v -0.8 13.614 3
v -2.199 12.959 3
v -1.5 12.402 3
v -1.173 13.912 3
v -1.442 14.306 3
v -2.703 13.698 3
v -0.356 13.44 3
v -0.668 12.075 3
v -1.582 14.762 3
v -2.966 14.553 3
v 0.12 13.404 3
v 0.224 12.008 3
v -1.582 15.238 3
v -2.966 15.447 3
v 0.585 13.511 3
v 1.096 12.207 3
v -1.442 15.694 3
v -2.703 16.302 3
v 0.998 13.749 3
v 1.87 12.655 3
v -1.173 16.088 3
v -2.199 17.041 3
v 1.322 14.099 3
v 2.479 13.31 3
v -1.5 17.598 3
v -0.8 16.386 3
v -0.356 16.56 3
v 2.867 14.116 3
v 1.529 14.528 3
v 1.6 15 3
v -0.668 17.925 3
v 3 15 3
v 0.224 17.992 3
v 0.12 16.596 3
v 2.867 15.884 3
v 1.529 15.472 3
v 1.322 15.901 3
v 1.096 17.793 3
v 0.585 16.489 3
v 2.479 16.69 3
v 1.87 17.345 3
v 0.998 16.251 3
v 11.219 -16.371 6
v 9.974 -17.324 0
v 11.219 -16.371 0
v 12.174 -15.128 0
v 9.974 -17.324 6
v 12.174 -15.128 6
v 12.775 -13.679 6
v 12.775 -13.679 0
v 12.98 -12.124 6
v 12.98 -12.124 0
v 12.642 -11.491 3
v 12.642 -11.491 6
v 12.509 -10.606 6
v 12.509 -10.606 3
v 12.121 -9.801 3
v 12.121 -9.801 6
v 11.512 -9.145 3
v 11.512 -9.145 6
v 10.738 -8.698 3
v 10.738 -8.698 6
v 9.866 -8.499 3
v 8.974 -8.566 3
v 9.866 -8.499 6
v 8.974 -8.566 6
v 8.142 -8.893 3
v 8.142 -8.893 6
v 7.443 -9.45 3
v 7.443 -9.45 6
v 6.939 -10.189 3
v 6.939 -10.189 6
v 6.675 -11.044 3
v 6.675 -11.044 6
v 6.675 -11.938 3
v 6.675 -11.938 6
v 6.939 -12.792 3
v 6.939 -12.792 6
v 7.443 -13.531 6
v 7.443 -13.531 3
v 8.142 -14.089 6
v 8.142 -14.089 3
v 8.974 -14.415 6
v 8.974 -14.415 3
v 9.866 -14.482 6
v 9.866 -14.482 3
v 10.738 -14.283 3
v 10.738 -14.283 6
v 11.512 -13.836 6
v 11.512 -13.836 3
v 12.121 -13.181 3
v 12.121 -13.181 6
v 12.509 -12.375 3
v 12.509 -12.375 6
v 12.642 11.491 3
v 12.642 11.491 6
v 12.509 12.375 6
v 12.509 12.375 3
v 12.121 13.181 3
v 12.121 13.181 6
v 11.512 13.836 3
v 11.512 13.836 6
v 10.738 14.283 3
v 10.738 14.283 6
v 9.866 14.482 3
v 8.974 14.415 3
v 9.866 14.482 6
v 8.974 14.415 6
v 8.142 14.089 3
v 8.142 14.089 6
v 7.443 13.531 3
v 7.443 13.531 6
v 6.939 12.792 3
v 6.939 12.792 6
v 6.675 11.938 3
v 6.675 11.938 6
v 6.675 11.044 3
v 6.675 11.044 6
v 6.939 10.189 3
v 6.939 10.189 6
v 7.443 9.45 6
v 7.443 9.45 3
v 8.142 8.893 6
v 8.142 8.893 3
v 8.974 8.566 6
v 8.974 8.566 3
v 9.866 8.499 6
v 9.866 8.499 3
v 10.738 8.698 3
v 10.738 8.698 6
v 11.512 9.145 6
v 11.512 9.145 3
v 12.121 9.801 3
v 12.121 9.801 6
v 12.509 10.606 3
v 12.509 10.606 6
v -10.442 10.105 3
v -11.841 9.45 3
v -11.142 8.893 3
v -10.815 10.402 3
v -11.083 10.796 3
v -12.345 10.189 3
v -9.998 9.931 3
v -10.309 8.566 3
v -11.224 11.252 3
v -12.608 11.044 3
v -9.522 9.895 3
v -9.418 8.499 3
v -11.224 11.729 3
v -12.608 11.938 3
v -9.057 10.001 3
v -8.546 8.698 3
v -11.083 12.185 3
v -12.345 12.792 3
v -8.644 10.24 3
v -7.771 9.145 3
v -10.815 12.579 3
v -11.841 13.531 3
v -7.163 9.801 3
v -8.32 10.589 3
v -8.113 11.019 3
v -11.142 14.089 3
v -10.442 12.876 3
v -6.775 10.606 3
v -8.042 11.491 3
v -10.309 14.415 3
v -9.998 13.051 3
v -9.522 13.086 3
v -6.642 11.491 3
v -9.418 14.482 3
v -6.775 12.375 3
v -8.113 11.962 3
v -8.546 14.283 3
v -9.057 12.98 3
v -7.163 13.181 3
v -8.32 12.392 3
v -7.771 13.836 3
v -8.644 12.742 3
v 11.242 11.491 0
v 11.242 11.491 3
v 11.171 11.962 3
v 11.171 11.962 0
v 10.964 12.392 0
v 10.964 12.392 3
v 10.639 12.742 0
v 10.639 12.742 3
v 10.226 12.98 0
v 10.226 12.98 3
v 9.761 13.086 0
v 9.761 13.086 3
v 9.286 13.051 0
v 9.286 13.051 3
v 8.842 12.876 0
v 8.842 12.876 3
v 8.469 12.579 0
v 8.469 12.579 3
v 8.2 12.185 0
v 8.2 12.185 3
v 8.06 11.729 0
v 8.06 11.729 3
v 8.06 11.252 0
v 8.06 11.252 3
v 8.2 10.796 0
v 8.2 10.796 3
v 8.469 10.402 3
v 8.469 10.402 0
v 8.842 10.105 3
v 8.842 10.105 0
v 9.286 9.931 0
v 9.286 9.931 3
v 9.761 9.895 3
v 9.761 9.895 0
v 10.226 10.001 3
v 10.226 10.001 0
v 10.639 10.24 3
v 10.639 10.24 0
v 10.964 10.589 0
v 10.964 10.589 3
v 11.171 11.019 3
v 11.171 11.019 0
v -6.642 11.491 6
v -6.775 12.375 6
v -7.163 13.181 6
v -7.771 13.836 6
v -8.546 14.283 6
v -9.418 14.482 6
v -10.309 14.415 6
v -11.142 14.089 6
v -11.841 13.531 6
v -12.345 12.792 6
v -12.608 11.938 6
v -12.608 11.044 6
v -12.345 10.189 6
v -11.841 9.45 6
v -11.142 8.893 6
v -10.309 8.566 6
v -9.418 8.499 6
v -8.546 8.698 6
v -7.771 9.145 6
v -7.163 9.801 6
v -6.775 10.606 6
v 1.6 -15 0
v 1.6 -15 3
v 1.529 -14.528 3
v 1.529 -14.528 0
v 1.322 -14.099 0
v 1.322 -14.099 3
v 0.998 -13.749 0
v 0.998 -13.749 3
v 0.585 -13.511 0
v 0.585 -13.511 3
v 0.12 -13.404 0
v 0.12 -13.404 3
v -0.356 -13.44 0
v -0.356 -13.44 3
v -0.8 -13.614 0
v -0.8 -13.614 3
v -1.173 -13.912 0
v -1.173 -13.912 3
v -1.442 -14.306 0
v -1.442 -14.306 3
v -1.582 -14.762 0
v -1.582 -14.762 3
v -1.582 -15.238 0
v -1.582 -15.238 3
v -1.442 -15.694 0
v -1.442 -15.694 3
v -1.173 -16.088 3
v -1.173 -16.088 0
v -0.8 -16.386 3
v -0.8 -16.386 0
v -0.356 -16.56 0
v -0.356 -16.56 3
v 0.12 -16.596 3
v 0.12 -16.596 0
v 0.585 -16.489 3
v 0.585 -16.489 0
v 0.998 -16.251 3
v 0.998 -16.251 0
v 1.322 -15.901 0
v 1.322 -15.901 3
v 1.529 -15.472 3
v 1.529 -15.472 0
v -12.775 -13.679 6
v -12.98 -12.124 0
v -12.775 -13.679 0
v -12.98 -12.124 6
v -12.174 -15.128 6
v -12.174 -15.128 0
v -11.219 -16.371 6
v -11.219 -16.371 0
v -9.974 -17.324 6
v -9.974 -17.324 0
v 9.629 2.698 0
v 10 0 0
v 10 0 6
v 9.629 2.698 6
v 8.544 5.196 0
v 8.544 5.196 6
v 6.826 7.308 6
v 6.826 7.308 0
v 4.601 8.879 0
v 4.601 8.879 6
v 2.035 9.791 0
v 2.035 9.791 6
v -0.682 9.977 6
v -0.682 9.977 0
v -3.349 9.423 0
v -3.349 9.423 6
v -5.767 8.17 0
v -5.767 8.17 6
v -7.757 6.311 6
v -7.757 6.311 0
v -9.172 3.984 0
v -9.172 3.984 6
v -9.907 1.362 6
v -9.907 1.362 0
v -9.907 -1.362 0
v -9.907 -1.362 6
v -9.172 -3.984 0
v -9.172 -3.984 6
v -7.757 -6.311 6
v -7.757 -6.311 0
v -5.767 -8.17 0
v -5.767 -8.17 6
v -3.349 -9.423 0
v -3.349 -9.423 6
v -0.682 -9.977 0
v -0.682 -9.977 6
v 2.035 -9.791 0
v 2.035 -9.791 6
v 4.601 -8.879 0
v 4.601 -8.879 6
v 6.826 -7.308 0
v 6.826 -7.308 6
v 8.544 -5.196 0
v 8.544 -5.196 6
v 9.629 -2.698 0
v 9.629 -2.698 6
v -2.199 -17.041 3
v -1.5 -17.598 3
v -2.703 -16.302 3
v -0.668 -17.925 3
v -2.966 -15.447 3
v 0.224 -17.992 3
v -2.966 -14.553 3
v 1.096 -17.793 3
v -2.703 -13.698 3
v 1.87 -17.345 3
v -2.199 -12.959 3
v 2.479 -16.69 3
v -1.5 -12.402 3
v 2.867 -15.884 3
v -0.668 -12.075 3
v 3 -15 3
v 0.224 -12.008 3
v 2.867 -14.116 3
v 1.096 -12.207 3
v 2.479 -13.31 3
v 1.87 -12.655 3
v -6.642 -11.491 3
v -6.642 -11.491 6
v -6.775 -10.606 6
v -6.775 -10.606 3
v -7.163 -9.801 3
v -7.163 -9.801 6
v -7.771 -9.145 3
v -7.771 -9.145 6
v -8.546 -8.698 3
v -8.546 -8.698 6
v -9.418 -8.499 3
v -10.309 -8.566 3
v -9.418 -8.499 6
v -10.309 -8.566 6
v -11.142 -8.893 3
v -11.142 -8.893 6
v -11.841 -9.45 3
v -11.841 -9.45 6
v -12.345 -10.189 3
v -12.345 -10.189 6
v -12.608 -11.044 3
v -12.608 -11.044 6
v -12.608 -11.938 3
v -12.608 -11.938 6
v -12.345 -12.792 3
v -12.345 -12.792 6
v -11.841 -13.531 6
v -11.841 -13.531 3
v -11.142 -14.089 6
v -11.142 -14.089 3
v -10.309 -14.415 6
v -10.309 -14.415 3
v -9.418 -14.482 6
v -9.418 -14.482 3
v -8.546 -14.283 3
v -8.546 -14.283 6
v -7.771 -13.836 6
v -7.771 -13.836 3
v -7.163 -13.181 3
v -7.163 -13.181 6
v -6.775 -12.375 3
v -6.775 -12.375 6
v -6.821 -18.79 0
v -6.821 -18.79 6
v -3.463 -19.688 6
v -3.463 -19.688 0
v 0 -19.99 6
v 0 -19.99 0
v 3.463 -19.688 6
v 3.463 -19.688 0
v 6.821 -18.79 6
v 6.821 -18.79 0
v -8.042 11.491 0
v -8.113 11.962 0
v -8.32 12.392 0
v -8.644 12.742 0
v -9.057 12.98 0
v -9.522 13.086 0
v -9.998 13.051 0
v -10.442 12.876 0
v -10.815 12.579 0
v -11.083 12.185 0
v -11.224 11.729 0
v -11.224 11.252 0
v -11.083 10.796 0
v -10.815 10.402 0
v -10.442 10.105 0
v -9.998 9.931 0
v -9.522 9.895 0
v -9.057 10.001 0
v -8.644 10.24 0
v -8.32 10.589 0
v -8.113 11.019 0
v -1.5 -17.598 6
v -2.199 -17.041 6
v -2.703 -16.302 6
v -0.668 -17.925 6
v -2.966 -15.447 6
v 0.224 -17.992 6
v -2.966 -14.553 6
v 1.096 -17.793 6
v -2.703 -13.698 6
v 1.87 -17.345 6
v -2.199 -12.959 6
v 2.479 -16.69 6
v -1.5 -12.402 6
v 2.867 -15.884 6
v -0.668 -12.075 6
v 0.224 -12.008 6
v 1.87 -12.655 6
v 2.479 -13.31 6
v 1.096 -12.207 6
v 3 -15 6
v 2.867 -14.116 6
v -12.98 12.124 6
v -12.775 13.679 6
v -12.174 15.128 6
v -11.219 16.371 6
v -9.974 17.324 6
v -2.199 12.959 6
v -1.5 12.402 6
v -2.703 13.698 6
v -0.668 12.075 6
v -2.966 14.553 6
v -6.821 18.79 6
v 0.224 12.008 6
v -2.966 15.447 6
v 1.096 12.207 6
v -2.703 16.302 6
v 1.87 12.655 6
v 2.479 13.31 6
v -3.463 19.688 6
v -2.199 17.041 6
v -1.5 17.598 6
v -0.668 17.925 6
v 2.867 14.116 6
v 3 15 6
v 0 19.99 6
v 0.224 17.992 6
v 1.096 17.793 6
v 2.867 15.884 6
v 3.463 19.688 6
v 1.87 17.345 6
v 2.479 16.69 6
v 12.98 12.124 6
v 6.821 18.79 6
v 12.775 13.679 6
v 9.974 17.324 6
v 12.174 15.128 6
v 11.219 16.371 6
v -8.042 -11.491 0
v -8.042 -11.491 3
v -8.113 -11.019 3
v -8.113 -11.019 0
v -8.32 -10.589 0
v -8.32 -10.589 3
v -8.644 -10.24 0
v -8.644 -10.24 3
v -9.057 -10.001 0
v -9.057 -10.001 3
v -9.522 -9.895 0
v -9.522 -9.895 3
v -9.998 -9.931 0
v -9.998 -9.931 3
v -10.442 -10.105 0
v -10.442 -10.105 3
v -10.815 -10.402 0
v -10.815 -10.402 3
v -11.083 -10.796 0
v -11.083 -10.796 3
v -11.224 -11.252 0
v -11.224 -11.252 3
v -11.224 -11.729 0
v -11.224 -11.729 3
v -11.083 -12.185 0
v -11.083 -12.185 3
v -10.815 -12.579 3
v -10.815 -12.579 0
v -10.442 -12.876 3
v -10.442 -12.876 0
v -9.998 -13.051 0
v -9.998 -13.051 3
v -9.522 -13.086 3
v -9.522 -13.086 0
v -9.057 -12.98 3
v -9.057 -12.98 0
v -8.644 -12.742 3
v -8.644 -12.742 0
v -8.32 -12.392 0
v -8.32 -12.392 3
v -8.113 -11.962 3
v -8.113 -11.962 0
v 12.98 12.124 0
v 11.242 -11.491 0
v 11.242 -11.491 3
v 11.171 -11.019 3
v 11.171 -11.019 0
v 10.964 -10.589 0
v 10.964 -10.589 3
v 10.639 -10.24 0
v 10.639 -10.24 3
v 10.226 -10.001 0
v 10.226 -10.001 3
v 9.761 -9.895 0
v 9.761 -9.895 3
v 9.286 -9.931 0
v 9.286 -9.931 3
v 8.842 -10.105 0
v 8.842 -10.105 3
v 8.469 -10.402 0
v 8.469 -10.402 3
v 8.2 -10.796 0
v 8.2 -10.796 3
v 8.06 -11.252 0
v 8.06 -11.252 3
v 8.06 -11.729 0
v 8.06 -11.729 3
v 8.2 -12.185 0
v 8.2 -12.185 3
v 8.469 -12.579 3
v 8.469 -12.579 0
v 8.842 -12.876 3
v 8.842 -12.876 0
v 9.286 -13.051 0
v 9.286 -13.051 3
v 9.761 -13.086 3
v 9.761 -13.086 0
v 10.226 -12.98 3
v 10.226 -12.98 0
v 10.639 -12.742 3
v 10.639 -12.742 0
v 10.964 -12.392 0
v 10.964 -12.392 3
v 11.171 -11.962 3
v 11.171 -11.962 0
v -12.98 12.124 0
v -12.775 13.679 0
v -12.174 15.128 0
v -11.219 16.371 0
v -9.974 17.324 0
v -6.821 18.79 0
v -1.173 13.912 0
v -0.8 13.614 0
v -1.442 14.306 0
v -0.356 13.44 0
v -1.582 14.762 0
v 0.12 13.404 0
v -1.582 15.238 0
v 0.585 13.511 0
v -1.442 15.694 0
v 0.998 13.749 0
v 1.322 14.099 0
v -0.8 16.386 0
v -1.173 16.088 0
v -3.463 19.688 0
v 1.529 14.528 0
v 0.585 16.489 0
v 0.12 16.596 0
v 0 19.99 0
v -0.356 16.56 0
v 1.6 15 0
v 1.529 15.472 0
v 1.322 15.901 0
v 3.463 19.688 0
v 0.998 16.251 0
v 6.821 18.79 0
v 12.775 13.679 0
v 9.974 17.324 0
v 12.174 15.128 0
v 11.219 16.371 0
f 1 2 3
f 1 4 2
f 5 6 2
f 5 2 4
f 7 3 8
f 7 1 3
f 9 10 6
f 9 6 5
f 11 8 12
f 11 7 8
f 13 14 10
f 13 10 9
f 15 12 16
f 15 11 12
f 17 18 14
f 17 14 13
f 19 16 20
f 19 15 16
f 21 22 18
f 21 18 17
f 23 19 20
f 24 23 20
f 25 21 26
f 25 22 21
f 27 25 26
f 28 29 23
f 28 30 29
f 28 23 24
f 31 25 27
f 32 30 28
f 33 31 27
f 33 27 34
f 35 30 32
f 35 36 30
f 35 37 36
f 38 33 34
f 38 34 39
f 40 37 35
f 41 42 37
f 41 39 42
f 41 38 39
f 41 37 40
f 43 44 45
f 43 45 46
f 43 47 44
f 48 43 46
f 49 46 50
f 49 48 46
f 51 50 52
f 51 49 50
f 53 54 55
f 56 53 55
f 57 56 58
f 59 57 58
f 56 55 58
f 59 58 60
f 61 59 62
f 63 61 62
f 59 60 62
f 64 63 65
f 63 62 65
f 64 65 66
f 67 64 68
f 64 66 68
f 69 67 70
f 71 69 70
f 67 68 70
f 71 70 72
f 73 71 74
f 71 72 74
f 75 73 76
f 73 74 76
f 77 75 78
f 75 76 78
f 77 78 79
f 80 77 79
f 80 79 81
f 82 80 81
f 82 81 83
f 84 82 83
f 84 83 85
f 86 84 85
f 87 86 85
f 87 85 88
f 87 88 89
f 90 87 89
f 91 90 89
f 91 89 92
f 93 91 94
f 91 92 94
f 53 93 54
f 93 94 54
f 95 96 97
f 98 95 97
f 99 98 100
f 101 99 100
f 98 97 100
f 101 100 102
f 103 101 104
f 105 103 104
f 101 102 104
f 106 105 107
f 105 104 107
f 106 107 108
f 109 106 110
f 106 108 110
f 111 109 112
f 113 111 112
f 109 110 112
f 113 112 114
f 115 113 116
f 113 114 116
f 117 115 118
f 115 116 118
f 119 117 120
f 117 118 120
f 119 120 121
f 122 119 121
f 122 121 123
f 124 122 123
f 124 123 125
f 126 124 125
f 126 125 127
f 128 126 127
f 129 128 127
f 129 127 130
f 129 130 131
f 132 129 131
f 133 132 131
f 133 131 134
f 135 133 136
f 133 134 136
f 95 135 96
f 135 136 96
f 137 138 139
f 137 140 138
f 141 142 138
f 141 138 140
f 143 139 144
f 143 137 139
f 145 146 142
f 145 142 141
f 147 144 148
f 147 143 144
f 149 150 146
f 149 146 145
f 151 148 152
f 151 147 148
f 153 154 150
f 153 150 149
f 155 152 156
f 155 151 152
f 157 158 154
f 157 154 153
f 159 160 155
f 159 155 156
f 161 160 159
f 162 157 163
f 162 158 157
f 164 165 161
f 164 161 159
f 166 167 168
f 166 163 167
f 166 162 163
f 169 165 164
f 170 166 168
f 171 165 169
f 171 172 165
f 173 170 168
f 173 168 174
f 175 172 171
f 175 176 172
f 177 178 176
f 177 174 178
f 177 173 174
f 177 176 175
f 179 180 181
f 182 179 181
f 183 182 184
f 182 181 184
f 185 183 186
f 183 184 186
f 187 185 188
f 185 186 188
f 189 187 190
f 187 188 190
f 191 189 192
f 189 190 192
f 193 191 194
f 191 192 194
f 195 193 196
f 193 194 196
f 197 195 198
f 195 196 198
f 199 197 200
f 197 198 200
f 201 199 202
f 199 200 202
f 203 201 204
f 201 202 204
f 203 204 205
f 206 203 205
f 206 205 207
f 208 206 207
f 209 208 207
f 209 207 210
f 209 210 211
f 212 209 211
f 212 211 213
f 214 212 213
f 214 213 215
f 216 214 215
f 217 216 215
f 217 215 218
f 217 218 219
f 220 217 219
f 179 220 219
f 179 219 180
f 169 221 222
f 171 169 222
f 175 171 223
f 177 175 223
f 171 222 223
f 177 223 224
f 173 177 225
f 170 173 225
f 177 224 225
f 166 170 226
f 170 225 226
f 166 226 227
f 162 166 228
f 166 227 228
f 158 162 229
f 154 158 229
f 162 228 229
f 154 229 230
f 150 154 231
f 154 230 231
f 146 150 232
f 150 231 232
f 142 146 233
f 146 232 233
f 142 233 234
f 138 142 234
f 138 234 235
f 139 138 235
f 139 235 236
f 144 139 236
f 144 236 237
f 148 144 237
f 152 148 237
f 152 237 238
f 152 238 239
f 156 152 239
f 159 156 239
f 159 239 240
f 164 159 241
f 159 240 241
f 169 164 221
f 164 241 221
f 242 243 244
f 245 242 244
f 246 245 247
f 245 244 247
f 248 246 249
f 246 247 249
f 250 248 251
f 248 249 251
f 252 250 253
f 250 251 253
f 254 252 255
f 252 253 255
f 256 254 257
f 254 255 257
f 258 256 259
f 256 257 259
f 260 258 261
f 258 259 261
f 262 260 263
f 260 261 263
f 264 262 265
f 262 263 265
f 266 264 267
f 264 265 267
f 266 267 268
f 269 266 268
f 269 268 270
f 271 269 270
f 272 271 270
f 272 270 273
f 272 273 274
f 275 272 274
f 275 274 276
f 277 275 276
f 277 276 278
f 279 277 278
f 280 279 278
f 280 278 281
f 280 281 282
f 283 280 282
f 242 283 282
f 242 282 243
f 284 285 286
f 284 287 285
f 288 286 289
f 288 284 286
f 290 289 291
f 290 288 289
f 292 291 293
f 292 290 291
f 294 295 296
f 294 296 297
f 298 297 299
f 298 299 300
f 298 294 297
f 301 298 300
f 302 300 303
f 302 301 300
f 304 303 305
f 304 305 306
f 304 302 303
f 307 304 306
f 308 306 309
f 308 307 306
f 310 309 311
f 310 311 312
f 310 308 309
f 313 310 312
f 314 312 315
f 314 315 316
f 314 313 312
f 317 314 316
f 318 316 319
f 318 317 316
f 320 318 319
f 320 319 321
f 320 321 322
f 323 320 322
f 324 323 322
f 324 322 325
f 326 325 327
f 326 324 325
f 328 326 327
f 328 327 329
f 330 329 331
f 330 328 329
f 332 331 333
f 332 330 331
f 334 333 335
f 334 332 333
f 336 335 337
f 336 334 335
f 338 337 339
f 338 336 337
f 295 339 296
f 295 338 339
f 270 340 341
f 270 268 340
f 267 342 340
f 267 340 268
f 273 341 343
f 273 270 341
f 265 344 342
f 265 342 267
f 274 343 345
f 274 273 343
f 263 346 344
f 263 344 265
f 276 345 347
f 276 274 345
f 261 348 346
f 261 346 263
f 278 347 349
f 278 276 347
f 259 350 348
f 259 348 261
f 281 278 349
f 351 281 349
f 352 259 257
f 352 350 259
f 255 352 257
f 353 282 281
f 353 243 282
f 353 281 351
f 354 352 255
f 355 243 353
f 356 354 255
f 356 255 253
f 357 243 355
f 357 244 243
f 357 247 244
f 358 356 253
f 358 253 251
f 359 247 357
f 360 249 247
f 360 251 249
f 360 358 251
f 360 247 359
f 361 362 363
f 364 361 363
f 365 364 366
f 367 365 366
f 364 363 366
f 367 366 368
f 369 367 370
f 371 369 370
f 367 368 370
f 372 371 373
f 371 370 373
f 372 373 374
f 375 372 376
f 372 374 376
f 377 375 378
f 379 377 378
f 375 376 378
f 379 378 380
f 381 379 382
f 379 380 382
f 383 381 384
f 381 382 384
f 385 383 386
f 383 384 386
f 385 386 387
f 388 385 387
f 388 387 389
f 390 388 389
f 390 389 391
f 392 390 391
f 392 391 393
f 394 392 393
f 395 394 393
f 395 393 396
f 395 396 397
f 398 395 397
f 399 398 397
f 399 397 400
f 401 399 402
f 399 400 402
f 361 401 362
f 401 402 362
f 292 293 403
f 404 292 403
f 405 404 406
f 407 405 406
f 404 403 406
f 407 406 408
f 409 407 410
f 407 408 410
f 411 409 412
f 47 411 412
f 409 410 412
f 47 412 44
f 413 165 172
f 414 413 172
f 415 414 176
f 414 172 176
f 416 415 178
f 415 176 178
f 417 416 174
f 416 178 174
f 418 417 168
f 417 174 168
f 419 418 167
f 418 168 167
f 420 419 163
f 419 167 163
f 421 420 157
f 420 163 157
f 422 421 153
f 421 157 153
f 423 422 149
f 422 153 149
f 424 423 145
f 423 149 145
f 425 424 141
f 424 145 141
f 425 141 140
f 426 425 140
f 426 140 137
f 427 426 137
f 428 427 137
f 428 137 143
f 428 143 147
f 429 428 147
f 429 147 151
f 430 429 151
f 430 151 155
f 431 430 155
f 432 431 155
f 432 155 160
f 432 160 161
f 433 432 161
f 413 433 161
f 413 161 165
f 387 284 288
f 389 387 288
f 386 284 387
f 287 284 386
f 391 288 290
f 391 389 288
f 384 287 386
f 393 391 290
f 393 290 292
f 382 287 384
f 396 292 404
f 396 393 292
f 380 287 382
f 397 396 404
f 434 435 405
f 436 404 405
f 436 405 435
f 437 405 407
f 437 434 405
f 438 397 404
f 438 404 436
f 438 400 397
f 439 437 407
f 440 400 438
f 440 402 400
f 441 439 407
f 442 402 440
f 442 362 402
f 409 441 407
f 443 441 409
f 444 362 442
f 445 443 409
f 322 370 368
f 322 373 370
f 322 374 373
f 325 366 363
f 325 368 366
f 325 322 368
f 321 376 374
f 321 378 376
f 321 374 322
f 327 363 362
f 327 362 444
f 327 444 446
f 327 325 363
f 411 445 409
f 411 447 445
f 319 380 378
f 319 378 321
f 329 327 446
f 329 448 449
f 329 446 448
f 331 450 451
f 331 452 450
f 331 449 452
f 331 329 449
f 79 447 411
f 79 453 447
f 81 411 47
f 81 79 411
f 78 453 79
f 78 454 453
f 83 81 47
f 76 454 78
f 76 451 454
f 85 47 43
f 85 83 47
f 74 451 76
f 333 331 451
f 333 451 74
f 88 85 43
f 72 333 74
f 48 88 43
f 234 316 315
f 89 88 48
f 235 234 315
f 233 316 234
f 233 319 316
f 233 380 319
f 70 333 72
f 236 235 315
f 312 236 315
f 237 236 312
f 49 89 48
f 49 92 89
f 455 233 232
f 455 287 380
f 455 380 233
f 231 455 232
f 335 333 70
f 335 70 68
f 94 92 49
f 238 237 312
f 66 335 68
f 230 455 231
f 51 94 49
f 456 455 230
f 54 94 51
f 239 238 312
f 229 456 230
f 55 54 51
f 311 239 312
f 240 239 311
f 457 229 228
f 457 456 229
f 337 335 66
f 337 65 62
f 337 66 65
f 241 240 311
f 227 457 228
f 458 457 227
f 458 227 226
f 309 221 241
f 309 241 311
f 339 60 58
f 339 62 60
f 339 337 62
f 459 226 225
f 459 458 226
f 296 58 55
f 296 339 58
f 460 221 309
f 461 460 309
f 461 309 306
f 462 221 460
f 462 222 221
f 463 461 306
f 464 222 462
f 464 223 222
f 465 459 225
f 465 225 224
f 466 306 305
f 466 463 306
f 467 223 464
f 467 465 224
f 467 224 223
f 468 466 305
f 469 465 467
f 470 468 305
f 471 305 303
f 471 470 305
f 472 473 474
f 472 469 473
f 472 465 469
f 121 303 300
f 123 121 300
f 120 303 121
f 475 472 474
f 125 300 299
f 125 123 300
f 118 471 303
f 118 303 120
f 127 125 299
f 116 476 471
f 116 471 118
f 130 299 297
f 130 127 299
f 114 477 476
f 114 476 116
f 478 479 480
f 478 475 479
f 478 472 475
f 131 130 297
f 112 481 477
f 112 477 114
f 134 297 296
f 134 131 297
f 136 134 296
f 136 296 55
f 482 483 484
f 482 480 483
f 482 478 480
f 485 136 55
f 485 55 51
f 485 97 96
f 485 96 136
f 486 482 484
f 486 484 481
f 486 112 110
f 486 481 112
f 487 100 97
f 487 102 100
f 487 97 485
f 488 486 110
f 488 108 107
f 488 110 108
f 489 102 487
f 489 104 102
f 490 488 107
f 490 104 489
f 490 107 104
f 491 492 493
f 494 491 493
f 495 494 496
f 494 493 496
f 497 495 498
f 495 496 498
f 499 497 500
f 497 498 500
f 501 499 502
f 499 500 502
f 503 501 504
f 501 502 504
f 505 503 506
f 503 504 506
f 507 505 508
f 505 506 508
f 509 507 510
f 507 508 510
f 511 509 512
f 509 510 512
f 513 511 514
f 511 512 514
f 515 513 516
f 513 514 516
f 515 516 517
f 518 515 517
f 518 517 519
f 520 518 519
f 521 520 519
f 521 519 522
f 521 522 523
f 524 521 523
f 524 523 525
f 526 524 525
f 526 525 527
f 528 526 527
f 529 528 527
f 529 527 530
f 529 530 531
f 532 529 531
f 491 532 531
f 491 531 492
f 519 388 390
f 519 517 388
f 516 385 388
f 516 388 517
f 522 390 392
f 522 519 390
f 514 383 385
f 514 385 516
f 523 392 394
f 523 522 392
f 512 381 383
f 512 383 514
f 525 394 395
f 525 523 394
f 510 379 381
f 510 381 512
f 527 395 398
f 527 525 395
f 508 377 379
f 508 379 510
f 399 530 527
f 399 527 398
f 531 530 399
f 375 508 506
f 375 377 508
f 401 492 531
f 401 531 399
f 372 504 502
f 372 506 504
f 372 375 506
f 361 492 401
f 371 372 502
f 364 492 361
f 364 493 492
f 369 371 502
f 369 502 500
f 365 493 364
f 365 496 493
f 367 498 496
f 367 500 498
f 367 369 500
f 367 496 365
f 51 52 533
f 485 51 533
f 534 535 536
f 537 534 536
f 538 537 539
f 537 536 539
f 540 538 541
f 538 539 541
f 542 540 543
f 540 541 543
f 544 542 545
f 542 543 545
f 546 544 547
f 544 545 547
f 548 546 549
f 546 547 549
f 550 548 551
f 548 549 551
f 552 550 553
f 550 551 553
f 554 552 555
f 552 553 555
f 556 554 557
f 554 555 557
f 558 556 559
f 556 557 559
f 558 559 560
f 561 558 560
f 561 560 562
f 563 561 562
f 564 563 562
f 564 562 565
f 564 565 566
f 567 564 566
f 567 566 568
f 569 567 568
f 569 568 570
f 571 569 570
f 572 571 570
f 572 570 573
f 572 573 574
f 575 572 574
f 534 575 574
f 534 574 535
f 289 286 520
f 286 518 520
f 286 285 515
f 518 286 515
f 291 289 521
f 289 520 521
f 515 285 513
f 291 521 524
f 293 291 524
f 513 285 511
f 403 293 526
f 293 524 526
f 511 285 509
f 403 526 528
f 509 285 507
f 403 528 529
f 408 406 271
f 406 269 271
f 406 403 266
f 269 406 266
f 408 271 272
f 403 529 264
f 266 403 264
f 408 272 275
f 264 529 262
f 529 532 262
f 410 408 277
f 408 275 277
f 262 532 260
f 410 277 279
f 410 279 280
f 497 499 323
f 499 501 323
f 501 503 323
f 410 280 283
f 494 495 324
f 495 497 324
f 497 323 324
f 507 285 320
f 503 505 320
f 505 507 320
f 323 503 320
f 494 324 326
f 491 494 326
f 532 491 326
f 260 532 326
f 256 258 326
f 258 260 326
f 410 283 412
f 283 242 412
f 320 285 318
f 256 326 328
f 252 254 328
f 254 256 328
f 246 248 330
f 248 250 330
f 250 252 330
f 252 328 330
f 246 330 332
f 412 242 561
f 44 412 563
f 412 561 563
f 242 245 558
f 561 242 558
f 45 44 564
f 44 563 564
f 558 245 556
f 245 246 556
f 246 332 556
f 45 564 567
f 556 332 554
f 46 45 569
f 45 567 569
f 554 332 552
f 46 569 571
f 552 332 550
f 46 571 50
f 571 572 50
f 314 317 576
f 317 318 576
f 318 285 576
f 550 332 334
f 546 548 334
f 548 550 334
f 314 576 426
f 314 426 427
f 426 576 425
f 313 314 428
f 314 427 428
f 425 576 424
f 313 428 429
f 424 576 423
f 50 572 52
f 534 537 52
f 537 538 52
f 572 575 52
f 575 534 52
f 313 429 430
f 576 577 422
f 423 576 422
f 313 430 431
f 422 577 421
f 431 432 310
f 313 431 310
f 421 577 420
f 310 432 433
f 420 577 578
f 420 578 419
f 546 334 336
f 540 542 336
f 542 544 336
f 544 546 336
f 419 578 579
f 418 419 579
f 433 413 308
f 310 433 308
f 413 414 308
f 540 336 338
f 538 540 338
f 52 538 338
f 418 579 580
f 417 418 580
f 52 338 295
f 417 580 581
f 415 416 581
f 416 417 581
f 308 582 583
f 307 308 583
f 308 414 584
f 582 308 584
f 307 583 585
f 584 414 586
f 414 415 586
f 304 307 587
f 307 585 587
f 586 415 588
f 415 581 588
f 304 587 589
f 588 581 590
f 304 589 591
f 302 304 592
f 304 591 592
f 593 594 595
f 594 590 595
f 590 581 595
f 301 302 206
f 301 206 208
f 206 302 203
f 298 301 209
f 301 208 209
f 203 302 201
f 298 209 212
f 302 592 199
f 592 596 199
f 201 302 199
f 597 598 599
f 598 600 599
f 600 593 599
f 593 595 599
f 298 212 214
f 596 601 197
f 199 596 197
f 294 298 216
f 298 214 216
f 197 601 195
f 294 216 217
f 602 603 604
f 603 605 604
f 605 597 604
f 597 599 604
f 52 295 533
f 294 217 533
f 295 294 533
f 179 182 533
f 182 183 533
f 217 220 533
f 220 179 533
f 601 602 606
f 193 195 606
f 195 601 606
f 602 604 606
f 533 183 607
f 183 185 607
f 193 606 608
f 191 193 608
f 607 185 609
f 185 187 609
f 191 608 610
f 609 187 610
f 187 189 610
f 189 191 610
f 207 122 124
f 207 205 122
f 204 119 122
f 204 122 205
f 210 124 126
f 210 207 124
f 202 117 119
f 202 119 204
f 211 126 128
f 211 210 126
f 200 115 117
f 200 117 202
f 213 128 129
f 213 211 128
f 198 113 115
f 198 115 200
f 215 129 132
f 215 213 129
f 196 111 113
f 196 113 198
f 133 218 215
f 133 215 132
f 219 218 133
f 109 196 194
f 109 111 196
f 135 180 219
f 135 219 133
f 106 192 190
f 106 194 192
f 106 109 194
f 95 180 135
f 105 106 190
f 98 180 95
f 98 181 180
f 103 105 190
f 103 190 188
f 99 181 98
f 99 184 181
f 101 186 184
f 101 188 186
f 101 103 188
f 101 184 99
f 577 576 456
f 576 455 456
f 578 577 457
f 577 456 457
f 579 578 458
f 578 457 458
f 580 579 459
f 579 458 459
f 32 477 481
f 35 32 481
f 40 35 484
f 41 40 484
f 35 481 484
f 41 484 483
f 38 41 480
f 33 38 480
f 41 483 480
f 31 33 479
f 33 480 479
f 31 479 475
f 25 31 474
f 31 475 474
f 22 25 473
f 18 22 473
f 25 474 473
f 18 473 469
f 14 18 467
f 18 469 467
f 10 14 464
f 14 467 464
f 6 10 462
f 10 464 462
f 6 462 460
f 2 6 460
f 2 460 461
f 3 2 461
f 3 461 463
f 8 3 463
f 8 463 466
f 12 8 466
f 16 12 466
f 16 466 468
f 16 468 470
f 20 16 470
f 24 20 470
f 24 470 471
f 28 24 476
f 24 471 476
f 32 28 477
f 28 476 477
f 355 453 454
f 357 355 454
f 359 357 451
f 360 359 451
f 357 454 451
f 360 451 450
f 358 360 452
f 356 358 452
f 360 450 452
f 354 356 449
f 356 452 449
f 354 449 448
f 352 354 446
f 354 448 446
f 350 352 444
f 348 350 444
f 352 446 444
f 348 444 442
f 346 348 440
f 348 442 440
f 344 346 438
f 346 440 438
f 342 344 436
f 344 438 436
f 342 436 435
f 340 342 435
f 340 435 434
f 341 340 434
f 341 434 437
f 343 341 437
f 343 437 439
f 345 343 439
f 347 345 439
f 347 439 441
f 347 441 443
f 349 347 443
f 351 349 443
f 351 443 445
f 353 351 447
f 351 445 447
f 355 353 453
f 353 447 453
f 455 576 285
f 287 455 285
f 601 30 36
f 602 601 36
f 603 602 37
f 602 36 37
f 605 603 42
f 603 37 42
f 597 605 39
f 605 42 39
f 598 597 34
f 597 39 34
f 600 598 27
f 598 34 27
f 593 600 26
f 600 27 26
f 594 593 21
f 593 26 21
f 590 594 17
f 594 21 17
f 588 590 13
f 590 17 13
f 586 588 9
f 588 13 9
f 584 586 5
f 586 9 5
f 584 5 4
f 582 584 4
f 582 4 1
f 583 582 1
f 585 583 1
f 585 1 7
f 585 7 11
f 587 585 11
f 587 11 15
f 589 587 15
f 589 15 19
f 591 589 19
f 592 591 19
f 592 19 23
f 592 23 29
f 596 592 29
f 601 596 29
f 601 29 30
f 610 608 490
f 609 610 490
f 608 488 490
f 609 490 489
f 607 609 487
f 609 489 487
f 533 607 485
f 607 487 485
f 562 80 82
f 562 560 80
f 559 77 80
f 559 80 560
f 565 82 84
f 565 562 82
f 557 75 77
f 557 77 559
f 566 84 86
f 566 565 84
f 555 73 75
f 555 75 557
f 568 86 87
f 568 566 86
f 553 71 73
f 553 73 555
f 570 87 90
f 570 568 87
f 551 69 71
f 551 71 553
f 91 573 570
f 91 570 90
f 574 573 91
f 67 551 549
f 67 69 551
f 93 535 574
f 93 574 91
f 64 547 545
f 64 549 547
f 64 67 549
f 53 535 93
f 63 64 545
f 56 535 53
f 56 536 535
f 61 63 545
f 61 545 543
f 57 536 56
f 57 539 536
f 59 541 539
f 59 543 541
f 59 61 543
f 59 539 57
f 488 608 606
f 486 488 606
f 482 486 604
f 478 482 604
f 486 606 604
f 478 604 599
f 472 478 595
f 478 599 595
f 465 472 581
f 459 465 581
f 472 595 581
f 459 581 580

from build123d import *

# Parameters (mm, degrees)
SKETCH_1_R          = 10
EXTRUDE_1_DEPTH     = 6
SKETCH_2_R          = 1.6
CUT_EXTRUDE_1_DEPTH = 7
FILLET_1_R          = 6
FILLET_2_R          = 6
FILLET_3_R          = 6
FILLET_4_R          = 6
SKETCH_3_R          = 3
CUT_EXTRUDE_2_DEPTH = 3


with BuildPart() as part:
    # 草图1 → 拉伸1 (new body)
    with BuildSketch(Plane.XY):
        with BuildLine():
            Line((-12.98, 15.202621484), (-12.98, -15.202621484))
            ThreePointArc((-12.98, -15.202621484), (0, -19.99), (12.98, -15.202621484))
            Line((12.98, -15.202621484), (12.98, 15.202621484))
            ThreePointArc((12.98, 15.202621484), (0, 19.99), (-12.98, 15.202621484))
        make_face()
        Circle(SKETCH_1_R, mode=Mode.SUBTRACT)
    extrude(amount=EXTRUDE_1_DEPTH)

    # 草图2 → 切除-拉伸1 (cut)
    with BuildSketch(Plane.XY.offset(6)):
        with Locations((-9.641814145, 11.490666647)):
            Circle(SKETCH_2_R)
        with Locations((0, 15)):
            Circle(SKETCH_2_R)
        with Locations((9.641814145, 11.490666647)):
            Circle(SKETCH_2_R)
        with Locations((-9.641814145, -11.490666647)):
            Circle(SKETCH_2_R)
        with Locations((0, -15)):
            Circle(SKETCH_2_R)
        with Locations((9.641814145, -11.490666647)):
            Circle(SKETCH_2_R)
    extrude(amount=-CUT_EXTRUDE_1_DEPTH, mode=Mode.SUBTRACT)

    # 圆角1
    fillet_1_edges = [part.edges().sort_by_distance(p)[0] for p in [
        (-12.98, 15.202621484, 3),
    ]]
    fillet(fillet_1_edges, radius=FILLET_1_R)

    # 圆角2
    fillet_2_edges = [part.edges().sort_by_distance(p)[0] for p in [
        (12.98, 15.202621484, 3),
    ]]
    fillet(fillet_2_edges, radius=FILLET_2_R)

    # 圆角3
    fillet_3_edges = [part.edges().sort_by_distance(p)[0] for p in [
        (-12.98, -15.202621484, 3),
    ]]
    fillet(fillet_3_edges, radius=FILLET_3_R)

    # 圆角4
    fillet_4_edges = [part.edges().sort_by_distance(p)[0] for p in [
        (12.98, -15.202621484, 3),
    ]]
    fillet(fillet_4_edges, radius=FILLET_4_R)

    # 草图3 → 切除-拉伸2 (cut)
    with BuildSketch(Plane.XY.offset(6)):
        with Locations((-9.641814145, 11.490666647)):
            Circle(SKETCH_3_R)
        with Locations((0, 15)):
            Circle(SKETCH_3_R)
        with Locations((9.641814145, 11.490666647)):
            Circle(SKETCH_3_R)
        with Locations((-9.641814145, -11.490666647)):
            Circle(SKETCH_3_R)
        with Locations((0, -15)):
            Circle(SKETCH_3_R)
        with Locations((9.641814145, -11.490666647)):
            Circle(SKETCH_3_R)
    extrude(amount=-CUT_EXTRUDE_2_DEPTH, mode=Mode.SUBTRACT)


solid = part.part
